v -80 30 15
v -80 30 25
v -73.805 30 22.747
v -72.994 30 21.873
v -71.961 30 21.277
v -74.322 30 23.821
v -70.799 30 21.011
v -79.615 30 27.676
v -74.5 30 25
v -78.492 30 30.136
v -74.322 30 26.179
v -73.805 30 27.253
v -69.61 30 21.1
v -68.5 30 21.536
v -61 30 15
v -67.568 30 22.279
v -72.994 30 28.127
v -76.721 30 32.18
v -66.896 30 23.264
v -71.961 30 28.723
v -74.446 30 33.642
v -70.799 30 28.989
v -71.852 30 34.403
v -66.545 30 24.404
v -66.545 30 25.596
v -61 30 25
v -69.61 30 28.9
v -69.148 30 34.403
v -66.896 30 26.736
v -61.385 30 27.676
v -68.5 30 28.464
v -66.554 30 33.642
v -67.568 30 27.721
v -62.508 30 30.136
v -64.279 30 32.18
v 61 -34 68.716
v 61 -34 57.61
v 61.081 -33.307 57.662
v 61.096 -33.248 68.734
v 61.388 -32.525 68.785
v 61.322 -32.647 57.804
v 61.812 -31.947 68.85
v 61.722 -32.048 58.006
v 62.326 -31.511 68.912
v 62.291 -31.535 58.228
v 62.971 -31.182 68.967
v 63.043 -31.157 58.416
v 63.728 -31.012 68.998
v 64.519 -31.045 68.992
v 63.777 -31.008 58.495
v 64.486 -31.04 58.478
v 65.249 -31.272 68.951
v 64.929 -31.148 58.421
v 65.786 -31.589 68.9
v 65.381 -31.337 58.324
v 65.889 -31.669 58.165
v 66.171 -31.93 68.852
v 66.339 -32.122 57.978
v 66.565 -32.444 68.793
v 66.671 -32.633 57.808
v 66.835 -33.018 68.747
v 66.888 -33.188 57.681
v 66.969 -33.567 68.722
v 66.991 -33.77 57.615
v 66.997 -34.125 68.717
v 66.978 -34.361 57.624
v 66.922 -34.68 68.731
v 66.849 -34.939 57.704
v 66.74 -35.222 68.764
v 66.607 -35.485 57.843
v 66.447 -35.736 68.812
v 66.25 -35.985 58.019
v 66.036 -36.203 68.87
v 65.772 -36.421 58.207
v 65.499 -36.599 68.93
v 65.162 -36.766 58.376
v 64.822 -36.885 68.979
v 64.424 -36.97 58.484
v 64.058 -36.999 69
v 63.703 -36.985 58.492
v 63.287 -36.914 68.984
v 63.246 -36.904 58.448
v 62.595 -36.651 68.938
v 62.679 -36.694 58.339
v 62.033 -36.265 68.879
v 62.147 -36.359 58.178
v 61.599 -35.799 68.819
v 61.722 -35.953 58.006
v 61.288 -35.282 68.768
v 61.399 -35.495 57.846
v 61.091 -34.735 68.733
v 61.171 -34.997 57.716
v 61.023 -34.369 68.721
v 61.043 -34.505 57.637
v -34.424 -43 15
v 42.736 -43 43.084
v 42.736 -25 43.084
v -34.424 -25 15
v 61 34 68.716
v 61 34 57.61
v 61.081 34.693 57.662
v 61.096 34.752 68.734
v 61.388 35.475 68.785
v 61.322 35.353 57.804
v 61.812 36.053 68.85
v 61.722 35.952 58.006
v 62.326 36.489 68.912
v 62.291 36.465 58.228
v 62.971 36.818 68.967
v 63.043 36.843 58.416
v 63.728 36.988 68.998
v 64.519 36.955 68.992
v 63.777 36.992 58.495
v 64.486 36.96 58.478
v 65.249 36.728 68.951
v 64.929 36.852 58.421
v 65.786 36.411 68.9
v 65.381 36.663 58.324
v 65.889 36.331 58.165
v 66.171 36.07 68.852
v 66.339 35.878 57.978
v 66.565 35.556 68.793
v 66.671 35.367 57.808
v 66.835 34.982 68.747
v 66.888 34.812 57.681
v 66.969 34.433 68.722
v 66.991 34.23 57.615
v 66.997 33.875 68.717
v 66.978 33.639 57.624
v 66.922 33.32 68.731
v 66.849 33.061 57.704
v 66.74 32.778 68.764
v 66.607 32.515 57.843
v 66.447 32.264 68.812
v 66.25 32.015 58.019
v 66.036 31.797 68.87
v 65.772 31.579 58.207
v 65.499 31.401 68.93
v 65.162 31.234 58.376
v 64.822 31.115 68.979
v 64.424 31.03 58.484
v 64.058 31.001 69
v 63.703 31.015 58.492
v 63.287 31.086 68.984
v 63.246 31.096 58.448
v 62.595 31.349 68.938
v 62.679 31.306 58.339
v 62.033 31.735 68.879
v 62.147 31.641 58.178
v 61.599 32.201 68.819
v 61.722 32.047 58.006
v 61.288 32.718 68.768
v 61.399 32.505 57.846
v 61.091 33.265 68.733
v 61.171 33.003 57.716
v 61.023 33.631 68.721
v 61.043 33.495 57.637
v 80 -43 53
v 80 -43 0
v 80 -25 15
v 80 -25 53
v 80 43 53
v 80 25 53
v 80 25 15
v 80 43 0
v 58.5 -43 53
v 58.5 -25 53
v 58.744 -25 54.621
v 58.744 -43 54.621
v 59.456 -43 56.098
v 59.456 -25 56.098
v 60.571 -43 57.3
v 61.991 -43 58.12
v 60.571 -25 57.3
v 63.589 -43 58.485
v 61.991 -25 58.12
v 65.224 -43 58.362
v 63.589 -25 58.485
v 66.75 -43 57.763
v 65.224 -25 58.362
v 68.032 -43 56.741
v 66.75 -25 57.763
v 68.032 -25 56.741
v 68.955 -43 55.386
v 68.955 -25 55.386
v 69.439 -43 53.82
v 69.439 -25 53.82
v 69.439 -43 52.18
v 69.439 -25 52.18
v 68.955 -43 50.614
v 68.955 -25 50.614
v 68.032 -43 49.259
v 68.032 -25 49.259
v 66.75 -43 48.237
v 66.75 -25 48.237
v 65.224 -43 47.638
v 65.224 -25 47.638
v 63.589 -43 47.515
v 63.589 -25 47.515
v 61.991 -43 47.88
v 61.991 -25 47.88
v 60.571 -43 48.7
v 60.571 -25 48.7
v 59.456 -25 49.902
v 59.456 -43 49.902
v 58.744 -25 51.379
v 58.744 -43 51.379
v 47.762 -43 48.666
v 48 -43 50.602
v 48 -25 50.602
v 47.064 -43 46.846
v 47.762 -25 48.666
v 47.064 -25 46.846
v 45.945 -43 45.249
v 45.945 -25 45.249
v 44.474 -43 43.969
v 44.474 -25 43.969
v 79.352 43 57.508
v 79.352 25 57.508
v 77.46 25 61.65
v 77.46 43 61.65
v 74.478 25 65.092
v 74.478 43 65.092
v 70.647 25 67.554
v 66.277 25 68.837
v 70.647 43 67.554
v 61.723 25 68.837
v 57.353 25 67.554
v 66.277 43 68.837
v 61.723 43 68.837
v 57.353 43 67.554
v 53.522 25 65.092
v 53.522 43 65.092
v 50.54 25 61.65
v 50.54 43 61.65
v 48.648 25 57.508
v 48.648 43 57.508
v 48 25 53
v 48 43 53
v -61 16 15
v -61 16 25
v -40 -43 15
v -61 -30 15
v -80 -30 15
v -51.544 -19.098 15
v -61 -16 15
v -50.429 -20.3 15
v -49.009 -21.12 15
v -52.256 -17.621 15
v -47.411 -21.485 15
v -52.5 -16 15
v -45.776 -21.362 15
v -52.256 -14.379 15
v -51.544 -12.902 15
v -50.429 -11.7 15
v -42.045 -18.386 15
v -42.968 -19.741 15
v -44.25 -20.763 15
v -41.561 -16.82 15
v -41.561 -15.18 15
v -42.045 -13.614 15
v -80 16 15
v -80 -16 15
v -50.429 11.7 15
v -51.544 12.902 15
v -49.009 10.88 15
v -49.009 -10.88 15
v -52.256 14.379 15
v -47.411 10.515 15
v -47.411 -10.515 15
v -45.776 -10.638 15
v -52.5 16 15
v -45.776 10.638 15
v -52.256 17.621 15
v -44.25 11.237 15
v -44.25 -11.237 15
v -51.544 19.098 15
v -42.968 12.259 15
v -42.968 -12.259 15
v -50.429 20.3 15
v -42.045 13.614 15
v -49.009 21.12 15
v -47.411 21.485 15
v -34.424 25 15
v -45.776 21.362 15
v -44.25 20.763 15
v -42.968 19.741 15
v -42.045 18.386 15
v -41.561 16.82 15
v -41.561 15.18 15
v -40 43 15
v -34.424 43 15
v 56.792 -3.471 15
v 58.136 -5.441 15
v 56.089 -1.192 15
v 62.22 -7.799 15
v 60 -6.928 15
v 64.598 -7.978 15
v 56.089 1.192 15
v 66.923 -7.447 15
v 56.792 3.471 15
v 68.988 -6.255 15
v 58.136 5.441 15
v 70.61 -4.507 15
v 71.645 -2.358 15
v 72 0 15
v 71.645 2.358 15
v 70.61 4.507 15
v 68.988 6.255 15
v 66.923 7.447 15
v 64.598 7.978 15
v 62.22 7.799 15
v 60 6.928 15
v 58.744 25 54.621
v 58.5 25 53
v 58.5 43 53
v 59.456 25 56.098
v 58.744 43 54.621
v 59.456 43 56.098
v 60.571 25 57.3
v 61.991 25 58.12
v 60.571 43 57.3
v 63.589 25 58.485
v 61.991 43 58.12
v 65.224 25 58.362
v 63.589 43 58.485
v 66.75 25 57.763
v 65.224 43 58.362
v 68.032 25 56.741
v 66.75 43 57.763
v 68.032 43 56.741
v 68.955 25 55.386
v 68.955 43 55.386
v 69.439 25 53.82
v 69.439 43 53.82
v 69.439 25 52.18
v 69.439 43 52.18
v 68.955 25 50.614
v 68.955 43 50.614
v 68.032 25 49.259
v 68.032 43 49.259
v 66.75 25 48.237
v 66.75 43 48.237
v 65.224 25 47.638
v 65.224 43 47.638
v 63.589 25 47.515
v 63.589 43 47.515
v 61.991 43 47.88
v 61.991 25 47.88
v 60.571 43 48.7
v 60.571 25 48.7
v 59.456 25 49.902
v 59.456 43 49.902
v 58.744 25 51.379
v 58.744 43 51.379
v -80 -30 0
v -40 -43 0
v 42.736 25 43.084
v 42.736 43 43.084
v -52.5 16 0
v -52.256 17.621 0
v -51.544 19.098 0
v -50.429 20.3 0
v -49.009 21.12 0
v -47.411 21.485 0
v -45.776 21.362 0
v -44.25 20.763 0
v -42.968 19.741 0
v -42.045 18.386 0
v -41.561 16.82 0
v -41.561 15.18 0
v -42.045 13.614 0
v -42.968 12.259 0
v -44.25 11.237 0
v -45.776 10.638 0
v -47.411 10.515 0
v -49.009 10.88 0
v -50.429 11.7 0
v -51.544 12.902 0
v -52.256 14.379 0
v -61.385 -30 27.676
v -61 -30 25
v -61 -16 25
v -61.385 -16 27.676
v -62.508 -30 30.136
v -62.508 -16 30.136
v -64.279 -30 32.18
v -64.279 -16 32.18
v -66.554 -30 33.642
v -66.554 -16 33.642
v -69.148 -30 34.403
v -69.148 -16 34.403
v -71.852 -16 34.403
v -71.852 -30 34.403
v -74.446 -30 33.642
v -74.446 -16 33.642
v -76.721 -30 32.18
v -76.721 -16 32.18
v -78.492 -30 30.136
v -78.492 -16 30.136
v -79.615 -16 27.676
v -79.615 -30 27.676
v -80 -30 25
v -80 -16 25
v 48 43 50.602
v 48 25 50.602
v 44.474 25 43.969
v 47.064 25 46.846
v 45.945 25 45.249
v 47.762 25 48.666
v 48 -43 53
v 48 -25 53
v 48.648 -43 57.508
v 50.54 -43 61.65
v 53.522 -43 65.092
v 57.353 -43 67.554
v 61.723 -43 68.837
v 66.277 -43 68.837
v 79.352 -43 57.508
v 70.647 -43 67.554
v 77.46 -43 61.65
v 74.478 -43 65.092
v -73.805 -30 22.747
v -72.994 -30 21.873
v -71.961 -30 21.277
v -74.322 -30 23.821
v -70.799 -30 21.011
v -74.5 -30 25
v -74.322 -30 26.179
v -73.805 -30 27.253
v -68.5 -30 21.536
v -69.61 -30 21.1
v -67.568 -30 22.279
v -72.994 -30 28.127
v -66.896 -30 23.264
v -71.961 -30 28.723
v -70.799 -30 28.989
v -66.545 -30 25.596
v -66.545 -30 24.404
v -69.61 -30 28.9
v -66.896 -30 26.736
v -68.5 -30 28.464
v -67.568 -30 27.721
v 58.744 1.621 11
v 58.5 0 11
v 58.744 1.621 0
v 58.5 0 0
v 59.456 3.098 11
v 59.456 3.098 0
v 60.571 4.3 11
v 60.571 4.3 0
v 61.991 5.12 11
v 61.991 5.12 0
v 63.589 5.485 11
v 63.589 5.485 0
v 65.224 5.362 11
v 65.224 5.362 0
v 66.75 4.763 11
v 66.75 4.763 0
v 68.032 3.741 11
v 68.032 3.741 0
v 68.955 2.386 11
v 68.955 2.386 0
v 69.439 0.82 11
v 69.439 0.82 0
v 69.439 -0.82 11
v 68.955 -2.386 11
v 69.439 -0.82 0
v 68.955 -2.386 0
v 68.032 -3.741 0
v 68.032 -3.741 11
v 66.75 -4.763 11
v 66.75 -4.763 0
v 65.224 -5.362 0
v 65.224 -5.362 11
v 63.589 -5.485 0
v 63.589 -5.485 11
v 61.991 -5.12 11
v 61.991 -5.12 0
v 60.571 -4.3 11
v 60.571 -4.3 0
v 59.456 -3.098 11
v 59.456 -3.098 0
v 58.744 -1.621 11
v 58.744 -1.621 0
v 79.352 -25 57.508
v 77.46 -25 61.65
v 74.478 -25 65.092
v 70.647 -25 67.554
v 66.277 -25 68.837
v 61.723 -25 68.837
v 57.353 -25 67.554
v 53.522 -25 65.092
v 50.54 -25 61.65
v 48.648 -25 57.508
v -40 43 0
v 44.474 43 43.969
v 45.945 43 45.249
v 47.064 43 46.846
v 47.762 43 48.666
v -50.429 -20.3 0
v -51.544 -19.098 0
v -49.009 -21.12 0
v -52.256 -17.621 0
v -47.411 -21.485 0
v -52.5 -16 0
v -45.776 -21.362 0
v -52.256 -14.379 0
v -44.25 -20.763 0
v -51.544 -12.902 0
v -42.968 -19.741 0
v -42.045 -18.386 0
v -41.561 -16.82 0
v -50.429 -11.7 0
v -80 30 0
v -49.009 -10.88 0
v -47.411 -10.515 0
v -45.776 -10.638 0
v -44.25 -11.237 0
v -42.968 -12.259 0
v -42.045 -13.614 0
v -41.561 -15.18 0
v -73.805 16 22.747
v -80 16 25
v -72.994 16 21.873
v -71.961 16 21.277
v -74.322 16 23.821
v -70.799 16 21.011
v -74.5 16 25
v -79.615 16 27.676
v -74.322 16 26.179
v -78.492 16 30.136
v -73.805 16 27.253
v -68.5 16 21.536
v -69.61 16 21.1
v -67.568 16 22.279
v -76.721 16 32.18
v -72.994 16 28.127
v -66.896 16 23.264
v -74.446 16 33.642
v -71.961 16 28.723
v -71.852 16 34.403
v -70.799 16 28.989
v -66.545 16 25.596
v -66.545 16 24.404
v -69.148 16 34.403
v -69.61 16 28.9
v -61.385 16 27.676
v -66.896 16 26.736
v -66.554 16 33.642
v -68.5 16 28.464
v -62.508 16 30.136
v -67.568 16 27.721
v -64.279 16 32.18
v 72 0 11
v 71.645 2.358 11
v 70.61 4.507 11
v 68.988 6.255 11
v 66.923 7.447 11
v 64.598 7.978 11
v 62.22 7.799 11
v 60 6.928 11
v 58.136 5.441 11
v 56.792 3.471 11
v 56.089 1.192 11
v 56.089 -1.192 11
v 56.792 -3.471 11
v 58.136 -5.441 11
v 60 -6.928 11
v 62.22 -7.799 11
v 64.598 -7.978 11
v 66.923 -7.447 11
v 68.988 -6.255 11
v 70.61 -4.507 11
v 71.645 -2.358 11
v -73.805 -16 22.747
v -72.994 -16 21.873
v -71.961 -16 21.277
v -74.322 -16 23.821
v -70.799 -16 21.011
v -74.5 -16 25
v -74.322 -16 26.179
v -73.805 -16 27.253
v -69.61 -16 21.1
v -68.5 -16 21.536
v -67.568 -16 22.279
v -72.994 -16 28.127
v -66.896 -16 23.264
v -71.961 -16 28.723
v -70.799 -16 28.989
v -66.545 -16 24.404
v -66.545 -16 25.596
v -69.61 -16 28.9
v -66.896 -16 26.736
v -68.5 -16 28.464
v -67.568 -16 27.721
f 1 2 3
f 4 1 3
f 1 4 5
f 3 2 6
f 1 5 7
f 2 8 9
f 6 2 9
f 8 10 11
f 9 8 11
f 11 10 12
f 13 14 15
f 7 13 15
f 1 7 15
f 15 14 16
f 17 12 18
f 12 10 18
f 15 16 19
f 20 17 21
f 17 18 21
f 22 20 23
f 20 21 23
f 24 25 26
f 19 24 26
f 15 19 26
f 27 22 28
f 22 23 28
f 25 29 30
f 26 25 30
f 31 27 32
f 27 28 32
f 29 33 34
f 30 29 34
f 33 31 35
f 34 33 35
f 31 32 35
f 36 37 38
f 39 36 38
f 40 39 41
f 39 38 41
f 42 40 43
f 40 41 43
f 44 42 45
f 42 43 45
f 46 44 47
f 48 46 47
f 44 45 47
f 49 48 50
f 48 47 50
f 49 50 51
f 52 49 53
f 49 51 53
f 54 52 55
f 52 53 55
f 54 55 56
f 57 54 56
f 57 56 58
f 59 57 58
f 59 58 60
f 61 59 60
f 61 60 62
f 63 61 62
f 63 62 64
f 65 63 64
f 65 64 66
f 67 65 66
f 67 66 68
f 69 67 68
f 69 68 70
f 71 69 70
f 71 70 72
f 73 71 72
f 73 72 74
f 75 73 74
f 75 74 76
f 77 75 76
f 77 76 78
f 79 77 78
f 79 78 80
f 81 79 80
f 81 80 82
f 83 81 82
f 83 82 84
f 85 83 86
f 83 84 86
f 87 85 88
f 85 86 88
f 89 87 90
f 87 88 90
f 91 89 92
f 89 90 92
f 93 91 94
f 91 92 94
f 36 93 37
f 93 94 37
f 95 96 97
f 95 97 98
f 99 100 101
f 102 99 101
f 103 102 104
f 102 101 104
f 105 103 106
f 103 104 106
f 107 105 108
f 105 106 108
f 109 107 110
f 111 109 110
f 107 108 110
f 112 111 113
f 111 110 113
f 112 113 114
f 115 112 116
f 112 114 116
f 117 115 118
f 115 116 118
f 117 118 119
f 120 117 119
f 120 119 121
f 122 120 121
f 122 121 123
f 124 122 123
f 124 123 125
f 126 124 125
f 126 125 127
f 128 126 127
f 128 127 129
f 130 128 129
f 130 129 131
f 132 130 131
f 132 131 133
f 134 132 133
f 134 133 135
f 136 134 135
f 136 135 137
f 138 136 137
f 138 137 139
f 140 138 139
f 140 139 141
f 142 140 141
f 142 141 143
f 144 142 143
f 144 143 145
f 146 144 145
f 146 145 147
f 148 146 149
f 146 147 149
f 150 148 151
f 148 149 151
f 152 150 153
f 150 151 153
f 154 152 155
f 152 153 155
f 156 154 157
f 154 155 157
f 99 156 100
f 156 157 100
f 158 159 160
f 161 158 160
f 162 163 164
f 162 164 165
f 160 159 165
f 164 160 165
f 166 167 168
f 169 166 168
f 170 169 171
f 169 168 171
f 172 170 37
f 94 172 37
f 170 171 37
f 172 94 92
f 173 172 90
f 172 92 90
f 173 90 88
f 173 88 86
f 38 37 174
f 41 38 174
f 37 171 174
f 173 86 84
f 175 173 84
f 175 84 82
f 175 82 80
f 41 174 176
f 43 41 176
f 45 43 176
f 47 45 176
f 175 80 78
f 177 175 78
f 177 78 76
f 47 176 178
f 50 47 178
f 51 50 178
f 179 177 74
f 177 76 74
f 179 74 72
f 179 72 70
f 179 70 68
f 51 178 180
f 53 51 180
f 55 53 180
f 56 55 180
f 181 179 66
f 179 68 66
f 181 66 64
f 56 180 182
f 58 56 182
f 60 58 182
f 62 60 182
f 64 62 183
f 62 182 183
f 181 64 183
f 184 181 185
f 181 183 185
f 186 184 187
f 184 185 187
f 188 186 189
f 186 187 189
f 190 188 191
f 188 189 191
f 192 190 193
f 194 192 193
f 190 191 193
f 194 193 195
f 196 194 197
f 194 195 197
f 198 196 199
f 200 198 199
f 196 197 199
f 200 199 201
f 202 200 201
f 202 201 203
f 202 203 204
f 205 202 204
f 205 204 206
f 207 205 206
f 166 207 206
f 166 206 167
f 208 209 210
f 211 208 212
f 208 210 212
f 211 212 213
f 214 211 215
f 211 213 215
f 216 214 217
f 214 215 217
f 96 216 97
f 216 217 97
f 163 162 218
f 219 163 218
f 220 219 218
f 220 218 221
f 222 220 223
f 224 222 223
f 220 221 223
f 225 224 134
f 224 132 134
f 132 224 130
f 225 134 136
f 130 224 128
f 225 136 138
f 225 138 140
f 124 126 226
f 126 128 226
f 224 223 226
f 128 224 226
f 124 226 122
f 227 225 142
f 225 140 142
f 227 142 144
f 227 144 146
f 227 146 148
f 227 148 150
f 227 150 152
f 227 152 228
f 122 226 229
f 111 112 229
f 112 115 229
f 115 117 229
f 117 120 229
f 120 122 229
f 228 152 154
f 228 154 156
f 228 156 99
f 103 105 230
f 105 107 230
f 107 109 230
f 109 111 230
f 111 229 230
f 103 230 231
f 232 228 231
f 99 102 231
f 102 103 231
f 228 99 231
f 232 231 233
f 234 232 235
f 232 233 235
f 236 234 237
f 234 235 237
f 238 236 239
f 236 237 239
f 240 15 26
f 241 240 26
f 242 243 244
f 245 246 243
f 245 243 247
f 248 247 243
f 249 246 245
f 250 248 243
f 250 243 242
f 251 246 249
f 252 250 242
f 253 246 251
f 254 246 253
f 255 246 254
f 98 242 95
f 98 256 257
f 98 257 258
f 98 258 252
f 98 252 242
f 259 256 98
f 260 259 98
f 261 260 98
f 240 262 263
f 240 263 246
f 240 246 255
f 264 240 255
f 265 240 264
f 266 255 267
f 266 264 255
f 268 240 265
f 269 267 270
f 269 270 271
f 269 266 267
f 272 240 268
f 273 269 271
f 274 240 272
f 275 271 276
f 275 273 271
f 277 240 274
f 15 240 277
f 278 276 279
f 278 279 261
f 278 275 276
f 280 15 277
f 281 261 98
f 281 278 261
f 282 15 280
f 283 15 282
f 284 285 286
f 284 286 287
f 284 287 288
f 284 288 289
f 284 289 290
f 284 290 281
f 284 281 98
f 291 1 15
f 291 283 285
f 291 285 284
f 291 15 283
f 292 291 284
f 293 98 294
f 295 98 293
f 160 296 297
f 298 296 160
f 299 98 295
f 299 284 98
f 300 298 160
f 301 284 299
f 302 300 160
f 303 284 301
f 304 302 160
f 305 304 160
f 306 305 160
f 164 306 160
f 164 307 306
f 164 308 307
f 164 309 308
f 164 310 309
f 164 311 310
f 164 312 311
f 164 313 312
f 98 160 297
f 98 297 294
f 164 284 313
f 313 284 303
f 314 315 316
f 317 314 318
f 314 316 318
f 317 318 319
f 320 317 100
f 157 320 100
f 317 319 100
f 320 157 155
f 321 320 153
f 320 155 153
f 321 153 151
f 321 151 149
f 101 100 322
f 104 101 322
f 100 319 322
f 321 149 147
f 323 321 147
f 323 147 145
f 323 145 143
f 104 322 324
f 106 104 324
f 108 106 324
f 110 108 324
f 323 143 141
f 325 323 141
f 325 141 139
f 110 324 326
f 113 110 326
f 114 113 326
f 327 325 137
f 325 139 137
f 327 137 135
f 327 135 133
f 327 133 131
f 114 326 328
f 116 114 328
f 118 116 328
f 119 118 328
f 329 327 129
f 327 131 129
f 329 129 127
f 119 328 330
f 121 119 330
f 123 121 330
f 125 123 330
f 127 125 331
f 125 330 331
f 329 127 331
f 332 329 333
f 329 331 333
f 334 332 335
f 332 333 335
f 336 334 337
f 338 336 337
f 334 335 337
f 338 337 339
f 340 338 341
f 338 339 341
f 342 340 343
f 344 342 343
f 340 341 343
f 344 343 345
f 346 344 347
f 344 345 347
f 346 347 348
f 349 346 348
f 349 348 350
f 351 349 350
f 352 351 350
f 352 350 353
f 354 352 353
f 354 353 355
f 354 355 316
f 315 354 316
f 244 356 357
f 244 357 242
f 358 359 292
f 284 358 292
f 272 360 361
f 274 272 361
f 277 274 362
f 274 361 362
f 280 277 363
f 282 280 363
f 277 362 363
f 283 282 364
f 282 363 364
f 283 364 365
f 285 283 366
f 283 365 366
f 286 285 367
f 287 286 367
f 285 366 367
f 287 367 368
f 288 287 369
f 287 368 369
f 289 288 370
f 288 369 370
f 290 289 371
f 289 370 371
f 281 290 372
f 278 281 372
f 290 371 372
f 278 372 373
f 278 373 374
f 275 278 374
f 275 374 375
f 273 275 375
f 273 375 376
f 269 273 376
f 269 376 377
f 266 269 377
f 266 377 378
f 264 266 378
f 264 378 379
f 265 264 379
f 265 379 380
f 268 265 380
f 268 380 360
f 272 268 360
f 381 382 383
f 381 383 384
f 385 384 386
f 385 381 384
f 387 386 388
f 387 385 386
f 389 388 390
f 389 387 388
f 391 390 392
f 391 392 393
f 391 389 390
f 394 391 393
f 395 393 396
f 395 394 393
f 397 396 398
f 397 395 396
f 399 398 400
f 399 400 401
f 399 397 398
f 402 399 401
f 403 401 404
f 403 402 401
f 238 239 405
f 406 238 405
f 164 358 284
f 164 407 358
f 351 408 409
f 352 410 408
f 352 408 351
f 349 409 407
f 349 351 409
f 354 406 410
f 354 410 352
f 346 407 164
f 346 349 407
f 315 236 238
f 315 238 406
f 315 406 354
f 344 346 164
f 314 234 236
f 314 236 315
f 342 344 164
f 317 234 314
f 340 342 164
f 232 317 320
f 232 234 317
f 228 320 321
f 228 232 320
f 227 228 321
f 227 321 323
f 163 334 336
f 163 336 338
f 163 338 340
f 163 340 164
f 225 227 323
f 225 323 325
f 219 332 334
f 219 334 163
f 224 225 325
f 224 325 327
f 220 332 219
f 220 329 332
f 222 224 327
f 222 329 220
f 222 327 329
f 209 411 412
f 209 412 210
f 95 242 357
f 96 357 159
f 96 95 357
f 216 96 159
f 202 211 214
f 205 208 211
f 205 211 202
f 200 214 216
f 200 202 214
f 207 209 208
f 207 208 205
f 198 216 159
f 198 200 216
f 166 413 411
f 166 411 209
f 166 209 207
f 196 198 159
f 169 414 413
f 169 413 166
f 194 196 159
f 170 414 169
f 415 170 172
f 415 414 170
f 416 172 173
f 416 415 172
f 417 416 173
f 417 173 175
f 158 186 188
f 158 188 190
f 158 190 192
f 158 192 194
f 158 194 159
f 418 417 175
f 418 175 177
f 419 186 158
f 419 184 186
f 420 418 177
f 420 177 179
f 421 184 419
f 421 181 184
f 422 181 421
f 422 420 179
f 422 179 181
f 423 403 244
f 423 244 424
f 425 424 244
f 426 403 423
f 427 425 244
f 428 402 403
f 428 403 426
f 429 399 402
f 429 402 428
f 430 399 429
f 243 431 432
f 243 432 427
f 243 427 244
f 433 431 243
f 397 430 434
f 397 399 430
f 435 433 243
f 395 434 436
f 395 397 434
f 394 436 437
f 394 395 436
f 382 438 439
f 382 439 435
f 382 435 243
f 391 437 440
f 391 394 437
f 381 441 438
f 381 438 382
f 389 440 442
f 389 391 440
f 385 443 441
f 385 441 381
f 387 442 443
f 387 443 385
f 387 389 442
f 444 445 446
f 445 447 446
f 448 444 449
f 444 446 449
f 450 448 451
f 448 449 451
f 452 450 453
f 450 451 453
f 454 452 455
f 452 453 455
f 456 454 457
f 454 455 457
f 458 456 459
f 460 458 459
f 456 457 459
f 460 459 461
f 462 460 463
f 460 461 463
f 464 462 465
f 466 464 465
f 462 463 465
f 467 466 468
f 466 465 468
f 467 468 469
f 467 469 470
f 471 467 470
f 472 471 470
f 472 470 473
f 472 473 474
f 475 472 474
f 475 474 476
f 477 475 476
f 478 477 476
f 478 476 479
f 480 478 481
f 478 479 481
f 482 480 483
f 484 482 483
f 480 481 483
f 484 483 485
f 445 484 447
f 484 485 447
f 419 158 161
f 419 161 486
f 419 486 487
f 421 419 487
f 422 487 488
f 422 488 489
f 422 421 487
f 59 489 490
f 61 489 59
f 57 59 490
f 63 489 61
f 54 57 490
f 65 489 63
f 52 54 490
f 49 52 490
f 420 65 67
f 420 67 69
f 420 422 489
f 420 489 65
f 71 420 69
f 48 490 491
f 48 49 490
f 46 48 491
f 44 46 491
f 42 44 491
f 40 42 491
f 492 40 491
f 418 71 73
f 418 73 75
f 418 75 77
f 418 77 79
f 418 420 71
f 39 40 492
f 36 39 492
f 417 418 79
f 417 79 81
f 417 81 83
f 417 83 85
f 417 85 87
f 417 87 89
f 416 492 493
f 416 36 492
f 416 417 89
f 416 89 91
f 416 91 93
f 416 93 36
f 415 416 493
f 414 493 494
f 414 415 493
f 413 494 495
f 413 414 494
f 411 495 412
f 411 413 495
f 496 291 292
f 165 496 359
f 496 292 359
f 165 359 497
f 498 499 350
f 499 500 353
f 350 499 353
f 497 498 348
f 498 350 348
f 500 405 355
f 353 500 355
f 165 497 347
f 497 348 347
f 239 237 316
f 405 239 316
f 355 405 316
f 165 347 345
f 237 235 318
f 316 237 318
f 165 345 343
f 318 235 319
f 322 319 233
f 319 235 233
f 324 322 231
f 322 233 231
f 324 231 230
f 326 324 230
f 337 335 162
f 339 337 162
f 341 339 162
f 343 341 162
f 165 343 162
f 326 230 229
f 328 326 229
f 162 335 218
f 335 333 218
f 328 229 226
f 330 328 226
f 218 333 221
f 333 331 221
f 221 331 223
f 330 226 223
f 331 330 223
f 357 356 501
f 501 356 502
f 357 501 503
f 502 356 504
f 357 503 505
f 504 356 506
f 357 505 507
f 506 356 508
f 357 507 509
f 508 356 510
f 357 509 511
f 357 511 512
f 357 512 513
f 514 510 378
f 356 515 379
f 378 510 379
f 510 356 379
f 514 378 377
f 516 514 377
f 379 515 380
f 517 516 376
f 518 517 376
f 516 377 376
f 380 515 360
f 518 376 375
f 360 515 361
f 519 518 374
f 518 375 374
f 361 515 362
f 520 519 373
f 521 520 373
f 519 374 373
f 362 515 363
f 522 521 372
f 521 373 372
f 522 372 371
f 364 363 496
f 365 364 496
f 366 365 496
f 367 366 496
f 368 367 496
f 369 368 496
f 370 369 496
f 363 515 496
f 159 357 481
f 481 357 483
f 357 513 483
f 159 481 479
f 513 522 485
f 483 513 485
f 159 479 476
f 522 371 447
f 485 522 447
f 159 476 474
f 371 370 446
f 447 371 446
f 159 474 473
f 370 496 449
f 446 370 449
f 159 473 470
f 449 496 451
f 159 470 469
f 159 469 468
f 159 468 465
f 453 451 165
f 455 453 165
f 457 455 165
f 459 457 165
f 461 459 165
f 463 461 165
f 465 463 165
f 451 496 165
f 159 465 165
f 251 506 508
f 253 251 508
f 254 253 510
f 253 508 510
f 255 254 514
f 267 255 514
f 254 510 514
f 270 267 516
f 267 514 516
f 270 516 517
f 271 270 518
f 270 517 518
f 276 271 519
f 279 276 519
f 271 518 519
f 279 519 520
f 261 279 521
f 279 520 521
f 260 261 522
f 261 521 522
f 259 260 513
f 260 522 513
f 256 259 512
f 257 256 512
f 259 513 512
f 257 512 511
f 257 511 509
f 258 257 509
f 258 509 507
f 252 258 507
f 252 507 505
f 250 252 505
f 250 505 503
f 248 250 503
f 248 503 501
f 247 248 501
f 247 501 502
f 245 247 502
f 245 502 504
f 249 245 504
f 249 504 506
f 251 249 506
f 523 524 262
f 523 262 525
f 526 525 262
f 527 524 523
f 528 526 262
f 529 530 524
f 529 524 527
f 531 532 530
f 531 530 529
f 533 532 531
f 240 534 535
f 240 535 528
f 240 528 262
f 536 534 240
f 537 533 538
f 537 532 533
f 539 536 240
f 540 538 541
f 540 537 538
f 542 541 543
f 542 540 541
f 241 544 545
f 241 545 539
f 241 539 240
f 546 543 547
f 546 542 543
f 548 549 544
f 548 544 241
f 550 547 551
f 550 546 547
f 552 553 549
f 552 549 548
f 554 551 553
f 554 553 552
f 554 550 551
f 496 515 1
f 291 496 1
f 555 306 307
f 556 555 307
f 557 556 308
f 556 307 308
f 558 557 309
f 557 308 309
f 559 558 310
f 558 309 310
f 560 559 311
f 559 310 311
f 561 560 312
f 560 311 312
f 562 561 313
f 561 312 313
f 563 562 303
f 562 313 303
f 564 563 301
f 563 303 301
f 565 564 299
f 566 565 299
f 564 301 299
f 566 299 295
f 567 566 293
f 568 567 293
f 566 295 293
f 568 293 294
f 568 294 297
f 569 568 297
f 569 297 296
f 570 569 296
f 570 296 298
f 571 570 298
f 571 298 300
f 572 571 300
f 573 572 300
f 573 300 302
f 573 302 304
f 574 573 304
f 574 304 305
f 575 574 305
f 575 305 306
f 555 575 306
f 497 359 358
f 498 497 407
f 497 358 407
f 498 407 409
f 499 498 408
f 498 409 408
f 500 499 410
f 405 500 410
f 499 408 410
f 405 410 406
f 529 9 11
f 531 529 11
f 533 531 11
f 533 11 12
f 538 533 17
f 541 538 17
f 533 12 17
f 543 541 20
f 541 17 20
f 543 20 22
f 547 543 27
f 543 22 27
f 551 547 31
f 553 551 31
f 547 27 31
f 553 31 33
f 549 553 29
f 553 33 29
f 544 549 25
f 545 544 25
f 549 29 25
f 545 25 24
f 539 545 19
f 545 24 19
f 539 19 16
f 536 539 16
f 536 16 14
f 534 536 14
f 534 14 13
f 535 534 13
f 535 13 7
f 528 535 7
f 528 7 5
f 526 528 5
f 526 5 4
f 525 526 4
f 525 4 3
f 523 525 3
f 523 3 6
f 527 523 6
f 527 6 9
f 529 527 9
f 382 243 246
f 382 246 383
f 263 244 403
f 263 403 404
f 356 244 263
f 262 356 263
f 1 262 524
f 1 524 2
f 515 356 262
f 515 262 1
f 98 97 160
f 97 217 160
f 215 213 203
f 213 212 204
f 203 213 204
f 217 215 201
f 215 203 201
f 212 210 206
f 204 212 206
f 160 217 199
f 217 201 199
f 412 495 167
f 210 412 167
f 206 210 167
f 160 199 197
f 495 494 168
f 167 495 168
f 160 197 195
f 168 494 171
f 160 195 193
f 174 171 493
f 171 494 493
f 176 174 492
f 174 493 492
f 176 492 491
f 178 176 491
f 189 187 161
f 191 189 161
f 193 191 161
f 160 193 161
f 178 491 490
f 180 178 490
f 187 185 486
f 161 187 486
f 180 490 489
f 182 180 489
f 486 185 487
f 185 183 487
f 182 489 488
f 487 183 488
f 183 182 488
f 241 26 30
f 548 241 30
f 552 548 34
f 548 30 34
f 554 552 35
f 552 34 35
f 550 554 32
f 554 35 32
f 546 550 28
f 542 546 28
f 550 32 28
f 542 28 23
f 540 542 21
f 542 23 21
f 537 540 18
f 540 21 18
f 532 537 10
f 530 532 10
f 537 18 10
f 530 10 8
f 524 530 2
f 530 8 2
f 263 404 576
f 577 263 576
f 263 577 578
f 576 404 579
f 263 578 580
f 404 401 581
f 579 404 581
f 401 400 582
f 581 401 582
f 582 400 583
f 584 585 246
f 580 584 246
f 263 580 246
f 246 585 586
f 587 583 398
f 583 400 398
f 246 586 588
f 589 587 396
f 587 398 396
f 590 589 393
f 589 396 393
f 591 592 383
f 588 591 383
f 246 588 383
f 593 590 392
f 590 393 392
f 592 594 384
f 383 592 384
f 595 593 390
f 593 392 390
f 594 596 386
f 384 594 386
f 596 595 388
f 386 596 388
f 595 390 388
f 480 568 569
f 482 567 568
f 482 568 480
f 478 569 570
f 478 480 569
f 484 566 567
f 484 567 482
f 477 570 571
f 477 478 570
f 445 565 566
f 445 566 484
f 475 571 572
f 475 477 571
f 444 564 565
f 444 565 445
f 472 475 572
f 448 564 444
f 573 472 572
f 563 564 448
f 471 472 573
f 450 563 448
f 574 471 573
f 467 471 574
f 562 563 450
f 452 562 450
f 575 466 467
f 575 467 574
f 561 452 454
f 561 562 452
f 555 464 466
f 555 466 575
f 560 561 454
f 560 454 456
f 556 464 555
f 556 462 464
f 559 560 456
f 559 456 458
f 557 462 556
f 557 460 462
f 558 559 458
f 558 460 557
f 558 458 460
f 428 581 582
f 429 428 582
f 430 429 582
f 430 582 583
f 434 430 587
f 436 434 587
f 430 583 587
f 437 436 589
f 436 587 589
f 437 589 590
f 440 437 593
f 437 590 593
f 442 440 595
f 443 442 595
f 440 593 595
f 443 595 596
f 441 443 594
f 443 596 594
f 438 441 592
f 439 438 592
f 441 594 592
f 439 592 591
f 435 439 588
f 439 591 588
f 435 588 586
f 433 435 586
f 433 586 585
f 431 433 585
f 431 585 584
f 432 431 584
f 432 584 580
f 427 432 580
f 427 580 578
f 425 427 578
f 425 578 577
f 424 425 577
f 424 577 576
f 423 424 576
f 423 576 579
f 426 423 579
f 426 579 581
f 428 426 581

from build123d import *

# Parameters (mm, degrees)
F0_W            = 160
F0_H            = 86
F1_DEPTH        = 15
F3_DEPTH        = 18
F4_R            = 8
F6_D            = 11
F9_DEPTH        = 14
F11_D           = 8
F12_C1_SIZE2    = 13
F12_C1_SIZE     = 40
F12_C2_SIZE2    = 40
F12_C2_SIZE     = 13
F16_D           = 6
F16_DEPTH       = 12
F16_START       = 0.2837665
F16_TIP         = 1.8025818571
F18_D           = 11
F20_D           = 11
F20_CBORE_D     = 16
F20_CBORE_DEPTH = 4


# Not quite as in the source:
# - two fillets or chamfers of one size are made in one step
# - a pattern or mirror of a feature is missing from the dataset's text; its kind, count and spacing are read off the source's solid


with BuildPart() as f1:
    # F0 (on Top) → F1 (new body)
    with BuildSketch(Plane.XY):
        Rectangle(F0_W, F0_H)
    extrude(amount=F1_DEPTH)

    # F2 (on face) → F3 (join)
    with BuildSketch(Plane.XZ.offset(43)):
        with BuildLine():
            Line((48, 45), (-34.4243225836, 15))
            Line((-34.4243225836, 15), (80, 15))
            Line((80, 15), (80, 53))
            ThreePointArc((80, 53), (64, 69), (48, 53))
            Line((48, 53), (48, 45))
        make_face()
    f3 = extrude(amount=-F3_DEPTH)

    # F3_copies: F3 across plane
    add(f3.mirror(Plane.ZX))

    # F4
    f4_edges = [f1.edges().sort_by_distance(p)[0] for p in [
        (48, -34, 45),
        (48, 34, 45),
    ]]
    fillet(f4_edges, radius=F4_R)

    # F6 (through all)
    with Locations(Plane.XZ.offset(43)):
        with Locations((64, 53)):
            Hole(F6_D / 2)

    # F8 (on offset) → F9 (join)
    with BuildSketch(Plane.XZ.offset(30)):
        with BuildLine():
            Line((-80, 25), (-80, 15))
            Line((-80, 15), (-61, 15))
            Line((-61, 15), (-61, 25))
            ThreePointArc((-61, 25), (-70.5, 34.5), (-80, 25))
        make_face()
    f9 = extrude(amount=-F9_DEPTH)

    # F9_copies: F9 across plane
    add(f9.mirror(Plane.ZX))

    # F11 (through all)
    with Locations(Plane.XZ.offset(30)):
        with Locations((-70.5, 25)):
            Hole(F11_D / 2)

    # F12: chamfer of 40 x 13 on 2 edges, made by hand

    # F12_c1
    f12_c1_edges = [f1.edges().sort_by_distance(p)[0] for p in [
        (-80, -43, 7.5),
    ]]
    f12_c1_side = f1.faces().sort_by_distance((-79.74, -43, 7.5))[0]
    chamfer(f12_c1_edges, length=F12_C1_SIZE, length2=F12_C1_SIZE2, reference=f12_c1_side)

    # F12_c2
    f12_c2_edges = [f1.edges().sort_by_distance(p)[0] for p in [
        (-80, 43, 7.5),
    ]]
    f12_c2_side = f1.faces().sort_by_distance((-80, 42.74, 7.5))[0]
    chamfer(f12_c2_edges, length=F12_C2_SIZE, length2=F12_C2_SIZE2, reference=f12_c2_side)

    # F16
    # its depths count from where the whole tool has entered the part; down to there all is cleared
    with Locations(Plane.XY.offset(69).offset(-F16_START)):
        with Locations((64, -34), (64, 34)):
            Hole(F16_D / 2, depth=F16_DEPTH)
            with Locations((0, 0, -(F16_DEPTH + F16_TIP / 2))):  # 118° drill point
                Cone(0, F16_D / 2, F16_TIP, mode=Mode.SUBTRACT)

    # F18 (through all)
    with Locations(Plane.XY.offset(15)):
        with Locations((-47, -16), (-47, 16)):
            Hole(F18_D / 2)

    # F20 (through all)
    with Locations(Plane.XY.offset(15)):
        with Locations((64, 0)):
            CounterBoreHole(F20_D / 2, F20_CBORE_D / 2, F20_CBORE_DEPTH)


solid = f1.part
